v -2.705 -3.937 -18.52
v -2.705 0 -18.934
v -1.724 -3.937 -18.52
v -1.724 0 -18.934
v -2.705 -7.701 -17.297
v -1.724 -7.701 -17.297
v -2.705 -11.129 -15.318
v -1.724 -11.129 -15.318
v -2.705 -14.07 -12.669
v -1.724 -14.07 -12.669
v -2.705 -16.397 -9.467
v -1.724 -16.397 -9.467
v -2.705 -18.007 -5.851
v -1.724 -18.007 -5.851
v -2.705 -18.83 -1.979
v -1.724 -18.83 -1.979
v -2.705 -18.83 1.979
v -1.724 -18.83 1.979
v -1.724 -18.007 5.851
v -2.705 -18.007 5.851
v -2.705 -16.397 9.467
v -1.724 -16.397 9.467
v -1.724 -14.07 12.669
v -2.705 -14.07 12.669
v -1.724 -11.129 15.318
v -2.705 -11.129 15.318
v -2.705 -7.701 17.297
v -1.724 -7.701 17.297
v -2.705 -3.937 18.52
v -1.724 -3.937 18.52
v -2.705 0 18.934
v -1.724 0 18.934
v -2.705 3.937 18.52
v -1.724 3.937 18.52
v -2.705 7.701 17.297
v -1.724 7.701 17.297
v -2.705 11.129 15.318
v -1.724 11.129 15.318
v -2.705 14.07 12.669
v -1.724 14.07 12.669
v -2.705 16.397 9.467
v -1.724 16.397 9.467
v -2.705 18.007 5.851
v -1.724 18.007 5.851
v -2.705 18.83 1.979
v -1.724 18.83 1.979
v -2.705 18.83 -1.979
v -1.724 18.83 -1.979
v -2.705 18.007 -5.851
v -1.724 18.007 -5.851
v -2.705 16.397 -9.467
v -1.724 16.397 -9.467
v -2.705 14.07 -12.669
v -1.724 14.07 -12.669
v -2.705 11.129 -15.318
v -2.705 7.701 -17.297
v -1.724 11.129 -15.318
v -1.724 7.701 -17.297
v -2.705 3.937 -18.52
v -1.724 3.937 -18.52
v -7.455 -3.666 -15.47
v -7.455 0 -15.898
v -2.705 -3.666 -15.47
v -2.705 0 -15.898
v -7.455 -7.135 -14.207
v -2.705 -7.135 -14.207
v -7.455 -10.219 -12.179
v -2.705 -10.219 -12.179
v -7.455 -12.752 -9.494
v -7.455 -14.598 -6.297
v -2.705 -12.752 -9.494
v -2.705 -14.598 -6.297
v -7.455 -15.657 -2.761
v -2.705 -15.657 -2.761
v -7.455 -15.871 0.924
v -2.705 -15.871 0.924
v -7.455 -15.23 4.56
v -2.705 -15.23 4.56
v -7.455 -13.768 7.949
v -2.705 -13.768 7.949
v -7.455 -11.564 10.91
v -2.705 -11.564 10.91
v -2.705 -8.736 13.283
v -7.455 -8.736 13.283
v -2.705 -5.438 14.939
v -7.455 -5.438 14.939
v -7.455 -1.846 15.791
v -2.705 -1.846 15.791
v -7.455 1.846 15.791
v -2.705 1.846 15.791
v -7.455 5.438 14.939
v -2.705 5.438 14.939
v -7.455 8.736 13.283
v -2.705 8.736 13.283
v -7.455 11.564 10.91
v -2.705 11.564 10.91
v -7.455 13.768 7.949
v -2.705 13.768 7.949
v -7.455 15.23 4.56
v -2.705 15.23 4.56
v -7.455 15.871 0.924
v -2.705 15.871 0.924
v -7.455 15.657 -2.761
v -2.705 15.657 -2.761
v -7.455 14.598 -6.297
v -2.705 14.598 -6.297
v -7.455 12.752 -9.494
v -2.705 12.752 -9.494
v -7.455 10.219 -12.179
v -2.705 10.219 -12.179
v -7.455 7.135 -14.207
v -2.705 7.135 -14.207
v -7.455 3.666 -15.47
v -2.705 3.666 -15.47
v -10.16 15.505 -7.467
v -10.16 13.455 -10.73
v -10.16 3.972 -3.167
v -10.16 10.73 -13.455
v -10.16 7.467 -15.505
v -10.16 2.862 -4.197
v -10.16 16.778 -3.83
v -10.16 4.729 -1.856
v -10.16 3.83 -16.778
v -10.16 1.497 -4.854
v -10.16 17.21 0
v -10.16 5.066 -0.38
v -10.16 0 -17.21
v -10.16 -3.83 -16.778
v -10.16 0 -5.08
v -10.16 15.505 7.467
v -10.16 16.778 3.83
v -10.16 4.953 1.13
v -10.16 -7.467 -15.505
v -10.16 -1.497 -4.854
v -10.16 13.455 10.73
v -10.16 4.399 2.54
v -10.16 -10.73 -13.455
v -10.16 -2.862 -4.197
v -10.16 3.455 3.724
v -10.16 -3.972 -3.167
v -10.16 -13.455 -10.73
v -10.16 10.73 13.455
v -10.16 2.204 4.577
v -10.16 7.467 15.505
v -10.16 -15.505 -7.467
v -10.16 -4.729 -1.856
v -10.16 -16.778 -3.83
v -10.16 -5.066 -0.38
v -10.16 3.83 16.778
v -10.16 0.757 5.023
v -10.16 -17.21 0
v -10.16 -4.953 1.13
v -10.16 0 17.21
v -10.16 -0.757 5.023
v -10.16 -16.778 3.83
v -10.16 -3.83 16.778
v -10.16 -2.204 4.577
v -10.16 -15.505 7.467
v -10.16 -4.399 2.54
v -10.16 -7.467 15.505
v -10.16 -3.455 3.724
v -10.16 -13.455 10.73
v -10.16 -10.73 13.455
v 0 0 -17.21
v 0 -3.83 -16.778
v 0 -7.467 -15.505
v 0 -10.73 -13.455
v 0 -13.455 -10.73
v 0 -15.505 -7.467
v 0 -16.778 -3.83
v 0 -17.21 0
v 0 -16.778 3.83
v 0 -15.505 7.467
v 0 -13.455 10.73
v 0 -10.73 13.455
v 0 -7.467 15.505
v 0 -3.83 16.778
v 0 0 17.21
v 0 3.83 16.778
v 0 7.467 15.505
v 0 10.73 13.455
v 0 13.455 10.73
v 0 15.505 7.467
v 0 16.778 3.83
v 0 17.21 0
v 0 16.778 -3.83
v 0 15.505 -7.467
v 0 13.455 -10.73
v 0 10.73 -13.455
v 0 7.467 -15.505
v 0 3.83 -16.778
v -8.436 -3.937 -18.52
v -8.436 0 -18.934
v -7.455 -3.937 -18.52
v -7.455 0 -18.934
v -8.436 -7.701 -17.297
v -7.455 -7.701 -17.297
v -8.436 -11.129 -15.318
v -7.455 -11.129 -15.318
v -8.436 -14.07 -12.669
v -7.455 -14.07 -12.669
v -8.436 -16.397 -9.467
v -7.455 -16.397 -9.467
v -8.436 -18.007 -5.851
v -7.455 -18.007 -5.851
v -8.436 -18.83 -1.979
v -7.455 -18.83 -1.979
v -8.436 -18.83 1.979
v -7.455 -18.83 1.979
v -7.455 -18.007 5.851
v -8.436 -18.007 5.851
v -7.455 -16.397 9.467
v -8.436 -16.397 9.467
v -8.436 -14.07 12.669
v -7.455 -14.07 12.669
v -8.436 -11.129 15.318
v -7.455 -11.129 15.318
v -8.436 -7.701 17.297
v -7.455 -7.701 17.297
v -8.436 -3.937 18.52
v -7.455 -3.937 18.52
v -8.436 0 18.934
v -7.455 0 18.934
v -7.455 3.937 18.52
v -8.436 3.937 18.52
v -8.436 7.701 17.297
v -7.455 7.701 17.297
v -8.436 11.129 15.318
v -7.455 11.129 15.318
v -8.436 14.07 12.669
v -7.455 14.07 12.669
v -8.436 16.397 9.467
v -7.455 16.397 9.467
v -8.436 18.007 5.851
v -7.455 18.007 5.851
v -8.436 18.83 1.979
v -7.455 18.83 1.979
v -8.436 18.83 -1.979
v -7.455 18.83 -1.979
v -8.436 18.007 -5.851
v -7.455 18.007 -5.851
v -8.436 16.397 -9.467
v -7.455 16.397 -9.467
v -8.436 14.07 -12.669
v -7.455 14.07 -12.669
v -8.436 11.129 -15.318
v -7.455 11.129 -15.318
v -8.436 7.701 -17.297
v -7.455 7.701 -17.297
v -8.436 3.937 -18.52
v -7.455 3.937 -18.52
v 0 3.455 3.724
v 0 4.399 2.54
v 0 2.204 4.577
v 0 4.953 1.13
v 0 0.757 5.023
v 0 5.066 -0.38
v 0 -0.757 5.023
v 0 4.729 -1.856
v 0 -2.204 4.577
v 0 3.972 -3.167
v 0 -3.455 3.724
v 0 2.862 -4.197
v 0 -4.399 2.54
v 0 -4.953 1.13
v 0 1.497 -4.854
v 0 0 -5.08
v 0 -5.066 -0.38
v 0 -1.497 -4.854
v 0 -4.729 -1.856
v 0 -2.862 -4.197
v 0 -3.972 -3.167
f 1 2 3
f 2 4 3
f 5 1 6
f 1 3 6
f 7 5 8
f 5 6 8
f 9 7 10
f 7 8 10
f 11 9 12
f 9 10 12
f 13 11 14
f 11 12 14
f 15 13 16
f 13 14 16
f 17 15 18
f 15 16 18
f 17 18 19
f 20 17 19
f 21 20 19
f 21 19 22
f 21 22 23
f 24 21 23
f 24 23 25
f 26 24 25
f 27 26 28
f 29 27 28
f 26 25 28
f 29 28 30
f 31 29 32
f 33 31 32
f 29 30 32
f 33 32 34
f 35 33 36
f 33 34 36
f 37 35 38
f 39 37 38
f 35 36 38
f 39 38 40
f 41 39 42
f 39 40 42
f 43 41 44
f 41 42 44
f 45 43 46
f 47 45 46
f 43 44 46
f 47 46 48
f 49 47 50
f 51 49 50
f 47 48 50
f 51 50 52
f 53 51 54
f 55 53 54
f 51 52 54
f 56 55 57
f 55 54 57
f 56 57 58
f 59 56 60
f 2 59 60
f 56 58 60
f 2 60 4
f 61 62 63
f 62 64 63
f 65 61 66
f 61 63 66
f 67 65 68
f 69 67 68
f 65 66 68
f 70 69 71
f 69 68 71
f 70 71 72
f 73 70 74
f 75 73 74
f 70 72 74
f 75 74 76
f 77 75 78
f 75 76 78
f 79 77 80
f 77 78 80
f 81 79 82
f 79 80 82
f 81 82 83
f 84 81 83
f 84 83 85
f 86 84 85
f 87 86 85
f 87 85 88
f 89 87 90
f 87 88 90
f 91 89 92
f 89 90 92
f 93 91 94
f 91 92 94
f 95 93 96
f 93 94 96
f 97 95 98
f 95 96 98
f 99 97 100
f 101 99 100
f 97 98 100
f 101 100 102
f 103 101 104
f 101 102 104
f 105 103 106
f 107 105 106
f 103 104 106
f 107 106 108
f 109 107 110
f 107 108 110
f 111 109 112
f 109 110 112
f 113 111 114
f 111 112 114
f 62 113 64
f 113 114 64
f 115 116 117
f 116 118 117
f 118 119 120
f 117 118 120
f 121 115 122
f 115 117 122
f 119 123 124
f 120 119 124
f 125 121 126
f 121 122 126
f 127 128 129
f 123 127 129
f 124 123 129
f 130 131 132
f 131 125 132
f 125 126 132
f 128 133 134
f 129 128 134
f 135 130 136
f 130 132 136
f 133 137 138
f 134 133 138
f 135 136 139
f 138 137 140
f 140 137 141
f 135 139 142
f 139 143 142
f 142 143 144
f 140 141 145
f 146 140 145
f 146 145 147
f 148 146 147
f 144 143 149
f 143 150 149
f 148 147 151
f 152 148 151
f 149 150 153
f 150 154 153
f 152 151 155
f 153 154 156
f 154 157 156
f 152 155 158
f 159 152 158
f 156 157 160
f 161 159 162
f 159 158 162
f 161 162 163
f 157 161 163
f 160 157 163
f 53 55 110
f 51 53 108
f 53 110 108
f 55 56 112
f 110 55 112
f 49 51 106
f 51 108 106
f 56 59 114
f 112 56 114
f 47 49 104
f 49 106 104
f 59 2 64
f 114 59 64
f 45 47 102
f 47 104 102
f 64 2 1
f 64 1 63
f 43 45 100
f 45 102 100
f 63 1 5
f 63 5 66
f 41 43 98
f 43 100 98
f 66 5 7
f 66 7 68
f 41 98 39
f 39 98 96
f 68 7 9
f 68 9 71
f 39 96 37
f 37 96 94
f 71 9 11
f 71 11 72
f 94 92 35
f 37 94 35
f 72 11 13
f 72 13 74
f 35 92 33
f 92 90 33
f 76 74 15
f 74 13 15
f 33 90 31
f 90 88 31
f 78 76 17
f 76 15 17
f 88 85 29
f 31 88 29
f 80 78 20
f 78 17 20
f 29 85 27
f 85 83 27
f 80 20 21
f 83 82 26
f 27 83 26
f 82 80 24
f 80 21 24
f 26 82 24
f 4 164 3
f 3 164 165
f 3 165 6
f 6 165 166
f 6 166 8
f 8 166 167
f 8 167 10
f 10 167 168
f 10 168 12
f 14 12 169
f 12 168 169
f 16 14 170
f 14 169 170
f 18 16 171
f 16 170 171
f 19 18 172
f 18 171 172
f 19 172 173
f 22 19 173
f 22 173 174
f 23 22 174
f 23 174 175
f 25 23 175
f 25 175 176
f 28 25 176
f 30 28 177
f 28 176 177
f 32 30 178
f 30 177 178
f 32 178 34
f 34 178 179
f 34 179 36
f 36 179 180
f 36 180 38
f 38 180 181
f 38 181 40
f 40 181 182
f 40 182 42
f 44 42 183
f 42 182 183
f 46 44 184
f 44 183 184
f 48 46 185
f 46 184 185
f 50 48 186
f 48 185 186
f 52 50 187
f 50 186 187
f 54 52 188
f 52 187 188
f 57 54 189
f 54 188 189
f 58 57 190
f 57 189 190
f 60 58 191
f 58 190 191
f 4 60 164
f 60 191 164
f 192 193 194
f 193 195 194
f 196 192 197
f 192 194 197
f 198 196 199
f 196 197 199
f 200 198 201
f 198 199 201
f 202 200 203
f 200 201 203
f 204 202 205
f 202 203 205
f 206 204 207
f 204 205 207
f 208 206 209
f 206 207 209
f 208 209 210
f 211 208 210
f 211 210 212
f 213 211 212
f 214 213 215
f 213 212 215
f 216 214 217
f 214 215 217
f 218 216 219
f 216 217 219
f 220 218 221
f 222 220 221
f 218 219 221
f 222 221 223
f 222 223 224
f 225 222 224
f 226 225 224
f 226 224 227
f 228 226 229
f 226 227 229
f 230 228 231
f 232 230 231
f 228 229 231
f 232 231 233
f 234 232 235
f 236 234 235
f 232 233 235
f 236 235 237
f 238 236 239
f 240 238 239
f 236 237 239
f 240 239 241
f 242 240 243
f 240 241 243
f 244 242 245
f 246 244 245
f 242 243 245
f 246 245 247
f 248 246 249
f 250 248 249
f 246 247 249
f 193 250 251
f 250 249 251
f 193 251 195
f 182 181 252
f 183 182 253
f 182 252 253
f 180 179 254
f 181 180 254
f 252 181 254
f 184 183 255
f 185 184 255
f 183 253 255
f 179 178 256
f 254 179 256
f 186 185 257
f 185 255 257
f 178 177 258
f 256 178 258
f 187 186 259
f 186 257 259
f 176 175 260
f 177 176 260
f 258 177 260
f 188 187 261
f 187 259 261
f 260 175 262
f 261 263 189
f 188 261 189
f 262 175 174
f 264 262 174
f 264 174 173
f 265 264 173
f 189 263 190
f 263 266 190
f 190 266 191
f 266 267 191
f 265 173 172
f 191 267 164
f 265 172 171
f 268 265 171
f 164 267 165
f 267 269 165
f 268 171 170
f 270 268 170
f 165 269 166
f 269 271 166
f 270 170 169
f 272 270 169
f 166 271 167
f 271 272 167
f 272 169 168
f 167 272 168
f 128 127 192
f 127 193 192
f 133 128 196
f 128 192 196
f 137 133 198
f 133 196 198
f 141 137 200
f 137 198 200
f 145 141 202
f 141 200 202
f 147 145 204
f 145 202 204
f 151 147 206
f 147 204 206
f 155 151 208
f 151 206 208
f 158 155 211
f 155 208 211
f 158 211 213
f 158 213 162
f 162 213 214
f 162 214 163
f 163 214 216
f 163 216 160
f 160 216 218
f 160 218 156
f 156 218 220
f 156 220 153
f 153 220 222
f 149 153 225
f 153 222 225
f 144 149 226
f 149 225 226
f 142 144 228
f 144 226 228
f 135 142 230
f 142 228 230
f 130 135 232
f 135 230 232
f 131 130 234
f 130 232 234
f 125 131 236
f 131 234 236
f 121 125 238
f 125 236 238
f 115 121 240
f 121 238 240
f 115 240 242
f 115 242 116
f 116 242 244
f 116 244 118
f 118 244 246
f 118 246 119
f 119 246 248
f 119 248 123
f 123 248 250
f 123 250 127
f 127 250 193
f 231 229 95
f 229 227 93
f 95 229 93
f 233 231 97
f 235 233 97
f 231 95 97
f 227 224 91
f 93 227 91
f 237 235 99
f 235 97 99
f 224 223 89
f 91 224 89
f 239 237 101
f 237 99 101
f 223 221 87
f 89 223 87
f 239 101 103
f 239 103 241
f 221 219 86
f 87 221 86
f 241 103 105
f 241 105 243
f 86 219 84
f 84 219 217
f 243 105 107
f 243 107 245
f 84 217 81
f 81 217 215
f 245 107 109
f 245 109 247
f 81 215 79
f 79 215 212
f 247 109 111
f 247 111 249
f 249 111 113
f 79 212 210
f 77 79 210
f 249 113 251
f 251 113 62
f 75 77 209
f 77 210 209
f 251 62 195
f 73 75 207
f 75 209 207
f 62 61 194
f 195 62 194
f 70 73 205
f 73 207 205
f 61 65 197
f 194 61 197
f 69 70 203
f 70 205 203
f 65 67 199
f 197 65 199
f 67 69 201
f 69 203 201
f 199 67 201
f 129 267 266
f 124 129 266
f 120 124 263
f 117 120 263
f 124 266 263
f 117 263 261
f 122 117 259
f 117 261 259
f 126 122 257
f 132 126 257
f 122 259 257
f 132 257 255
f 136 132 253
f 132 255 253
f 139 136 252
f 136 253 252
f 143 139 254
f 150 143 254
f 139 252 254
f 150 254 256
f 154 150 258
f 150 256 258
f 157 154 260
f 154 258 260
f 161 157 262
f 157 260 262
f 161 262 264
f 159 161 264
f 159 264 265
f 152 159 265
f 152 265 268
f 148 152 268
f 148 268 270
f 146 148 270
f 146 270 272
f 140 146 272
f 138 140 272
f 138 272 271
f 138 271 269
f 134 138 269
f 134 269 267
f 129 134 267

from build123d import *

# Parameters (mm, degrees)
SKETCH3_R          = 5.08
CUT_EXTRUDE1_DEPTH = 29.638898375


with BuildPart() as part:
    # Sketch2 → Revolve1 (revolve)
    with BuildSketch(Plane.XY, mode=Mode.PRIVATE) as revolve1_sk:
        Polygon((0, 0), (-10.16, 0), (-10.16, 17.209662464), (-8.436082504, 18.933579959), (-7.4549, 18.933579959), (-7.4549, 15.898279959), (-2.7051, 15.898279959), (-2.7051, 18.933579959), (-1.723917496, 18.933579959), (0, 17.209662464), align=None)
    revolve(revolve1_sk.sketch.rotate(Axis((0, 0, 0), (-1, 0, 0)), 90), axis=Axis((0, 0, 0), (-1, 0, 0)))

    # Sketch3 → Cut-Extrude1 (cut, through all)
    with BuildSketch(Plane(origin=(0, 0, 0), x_dir=(0, 0, -1), z_dir=(1, 0, 0))):
        Circle(SKETCH3_R)
    extrude(amount=-CUT_EXTRUDE1_DEPTH, mode=Mode.SUBTRACT)


solid = part.part
